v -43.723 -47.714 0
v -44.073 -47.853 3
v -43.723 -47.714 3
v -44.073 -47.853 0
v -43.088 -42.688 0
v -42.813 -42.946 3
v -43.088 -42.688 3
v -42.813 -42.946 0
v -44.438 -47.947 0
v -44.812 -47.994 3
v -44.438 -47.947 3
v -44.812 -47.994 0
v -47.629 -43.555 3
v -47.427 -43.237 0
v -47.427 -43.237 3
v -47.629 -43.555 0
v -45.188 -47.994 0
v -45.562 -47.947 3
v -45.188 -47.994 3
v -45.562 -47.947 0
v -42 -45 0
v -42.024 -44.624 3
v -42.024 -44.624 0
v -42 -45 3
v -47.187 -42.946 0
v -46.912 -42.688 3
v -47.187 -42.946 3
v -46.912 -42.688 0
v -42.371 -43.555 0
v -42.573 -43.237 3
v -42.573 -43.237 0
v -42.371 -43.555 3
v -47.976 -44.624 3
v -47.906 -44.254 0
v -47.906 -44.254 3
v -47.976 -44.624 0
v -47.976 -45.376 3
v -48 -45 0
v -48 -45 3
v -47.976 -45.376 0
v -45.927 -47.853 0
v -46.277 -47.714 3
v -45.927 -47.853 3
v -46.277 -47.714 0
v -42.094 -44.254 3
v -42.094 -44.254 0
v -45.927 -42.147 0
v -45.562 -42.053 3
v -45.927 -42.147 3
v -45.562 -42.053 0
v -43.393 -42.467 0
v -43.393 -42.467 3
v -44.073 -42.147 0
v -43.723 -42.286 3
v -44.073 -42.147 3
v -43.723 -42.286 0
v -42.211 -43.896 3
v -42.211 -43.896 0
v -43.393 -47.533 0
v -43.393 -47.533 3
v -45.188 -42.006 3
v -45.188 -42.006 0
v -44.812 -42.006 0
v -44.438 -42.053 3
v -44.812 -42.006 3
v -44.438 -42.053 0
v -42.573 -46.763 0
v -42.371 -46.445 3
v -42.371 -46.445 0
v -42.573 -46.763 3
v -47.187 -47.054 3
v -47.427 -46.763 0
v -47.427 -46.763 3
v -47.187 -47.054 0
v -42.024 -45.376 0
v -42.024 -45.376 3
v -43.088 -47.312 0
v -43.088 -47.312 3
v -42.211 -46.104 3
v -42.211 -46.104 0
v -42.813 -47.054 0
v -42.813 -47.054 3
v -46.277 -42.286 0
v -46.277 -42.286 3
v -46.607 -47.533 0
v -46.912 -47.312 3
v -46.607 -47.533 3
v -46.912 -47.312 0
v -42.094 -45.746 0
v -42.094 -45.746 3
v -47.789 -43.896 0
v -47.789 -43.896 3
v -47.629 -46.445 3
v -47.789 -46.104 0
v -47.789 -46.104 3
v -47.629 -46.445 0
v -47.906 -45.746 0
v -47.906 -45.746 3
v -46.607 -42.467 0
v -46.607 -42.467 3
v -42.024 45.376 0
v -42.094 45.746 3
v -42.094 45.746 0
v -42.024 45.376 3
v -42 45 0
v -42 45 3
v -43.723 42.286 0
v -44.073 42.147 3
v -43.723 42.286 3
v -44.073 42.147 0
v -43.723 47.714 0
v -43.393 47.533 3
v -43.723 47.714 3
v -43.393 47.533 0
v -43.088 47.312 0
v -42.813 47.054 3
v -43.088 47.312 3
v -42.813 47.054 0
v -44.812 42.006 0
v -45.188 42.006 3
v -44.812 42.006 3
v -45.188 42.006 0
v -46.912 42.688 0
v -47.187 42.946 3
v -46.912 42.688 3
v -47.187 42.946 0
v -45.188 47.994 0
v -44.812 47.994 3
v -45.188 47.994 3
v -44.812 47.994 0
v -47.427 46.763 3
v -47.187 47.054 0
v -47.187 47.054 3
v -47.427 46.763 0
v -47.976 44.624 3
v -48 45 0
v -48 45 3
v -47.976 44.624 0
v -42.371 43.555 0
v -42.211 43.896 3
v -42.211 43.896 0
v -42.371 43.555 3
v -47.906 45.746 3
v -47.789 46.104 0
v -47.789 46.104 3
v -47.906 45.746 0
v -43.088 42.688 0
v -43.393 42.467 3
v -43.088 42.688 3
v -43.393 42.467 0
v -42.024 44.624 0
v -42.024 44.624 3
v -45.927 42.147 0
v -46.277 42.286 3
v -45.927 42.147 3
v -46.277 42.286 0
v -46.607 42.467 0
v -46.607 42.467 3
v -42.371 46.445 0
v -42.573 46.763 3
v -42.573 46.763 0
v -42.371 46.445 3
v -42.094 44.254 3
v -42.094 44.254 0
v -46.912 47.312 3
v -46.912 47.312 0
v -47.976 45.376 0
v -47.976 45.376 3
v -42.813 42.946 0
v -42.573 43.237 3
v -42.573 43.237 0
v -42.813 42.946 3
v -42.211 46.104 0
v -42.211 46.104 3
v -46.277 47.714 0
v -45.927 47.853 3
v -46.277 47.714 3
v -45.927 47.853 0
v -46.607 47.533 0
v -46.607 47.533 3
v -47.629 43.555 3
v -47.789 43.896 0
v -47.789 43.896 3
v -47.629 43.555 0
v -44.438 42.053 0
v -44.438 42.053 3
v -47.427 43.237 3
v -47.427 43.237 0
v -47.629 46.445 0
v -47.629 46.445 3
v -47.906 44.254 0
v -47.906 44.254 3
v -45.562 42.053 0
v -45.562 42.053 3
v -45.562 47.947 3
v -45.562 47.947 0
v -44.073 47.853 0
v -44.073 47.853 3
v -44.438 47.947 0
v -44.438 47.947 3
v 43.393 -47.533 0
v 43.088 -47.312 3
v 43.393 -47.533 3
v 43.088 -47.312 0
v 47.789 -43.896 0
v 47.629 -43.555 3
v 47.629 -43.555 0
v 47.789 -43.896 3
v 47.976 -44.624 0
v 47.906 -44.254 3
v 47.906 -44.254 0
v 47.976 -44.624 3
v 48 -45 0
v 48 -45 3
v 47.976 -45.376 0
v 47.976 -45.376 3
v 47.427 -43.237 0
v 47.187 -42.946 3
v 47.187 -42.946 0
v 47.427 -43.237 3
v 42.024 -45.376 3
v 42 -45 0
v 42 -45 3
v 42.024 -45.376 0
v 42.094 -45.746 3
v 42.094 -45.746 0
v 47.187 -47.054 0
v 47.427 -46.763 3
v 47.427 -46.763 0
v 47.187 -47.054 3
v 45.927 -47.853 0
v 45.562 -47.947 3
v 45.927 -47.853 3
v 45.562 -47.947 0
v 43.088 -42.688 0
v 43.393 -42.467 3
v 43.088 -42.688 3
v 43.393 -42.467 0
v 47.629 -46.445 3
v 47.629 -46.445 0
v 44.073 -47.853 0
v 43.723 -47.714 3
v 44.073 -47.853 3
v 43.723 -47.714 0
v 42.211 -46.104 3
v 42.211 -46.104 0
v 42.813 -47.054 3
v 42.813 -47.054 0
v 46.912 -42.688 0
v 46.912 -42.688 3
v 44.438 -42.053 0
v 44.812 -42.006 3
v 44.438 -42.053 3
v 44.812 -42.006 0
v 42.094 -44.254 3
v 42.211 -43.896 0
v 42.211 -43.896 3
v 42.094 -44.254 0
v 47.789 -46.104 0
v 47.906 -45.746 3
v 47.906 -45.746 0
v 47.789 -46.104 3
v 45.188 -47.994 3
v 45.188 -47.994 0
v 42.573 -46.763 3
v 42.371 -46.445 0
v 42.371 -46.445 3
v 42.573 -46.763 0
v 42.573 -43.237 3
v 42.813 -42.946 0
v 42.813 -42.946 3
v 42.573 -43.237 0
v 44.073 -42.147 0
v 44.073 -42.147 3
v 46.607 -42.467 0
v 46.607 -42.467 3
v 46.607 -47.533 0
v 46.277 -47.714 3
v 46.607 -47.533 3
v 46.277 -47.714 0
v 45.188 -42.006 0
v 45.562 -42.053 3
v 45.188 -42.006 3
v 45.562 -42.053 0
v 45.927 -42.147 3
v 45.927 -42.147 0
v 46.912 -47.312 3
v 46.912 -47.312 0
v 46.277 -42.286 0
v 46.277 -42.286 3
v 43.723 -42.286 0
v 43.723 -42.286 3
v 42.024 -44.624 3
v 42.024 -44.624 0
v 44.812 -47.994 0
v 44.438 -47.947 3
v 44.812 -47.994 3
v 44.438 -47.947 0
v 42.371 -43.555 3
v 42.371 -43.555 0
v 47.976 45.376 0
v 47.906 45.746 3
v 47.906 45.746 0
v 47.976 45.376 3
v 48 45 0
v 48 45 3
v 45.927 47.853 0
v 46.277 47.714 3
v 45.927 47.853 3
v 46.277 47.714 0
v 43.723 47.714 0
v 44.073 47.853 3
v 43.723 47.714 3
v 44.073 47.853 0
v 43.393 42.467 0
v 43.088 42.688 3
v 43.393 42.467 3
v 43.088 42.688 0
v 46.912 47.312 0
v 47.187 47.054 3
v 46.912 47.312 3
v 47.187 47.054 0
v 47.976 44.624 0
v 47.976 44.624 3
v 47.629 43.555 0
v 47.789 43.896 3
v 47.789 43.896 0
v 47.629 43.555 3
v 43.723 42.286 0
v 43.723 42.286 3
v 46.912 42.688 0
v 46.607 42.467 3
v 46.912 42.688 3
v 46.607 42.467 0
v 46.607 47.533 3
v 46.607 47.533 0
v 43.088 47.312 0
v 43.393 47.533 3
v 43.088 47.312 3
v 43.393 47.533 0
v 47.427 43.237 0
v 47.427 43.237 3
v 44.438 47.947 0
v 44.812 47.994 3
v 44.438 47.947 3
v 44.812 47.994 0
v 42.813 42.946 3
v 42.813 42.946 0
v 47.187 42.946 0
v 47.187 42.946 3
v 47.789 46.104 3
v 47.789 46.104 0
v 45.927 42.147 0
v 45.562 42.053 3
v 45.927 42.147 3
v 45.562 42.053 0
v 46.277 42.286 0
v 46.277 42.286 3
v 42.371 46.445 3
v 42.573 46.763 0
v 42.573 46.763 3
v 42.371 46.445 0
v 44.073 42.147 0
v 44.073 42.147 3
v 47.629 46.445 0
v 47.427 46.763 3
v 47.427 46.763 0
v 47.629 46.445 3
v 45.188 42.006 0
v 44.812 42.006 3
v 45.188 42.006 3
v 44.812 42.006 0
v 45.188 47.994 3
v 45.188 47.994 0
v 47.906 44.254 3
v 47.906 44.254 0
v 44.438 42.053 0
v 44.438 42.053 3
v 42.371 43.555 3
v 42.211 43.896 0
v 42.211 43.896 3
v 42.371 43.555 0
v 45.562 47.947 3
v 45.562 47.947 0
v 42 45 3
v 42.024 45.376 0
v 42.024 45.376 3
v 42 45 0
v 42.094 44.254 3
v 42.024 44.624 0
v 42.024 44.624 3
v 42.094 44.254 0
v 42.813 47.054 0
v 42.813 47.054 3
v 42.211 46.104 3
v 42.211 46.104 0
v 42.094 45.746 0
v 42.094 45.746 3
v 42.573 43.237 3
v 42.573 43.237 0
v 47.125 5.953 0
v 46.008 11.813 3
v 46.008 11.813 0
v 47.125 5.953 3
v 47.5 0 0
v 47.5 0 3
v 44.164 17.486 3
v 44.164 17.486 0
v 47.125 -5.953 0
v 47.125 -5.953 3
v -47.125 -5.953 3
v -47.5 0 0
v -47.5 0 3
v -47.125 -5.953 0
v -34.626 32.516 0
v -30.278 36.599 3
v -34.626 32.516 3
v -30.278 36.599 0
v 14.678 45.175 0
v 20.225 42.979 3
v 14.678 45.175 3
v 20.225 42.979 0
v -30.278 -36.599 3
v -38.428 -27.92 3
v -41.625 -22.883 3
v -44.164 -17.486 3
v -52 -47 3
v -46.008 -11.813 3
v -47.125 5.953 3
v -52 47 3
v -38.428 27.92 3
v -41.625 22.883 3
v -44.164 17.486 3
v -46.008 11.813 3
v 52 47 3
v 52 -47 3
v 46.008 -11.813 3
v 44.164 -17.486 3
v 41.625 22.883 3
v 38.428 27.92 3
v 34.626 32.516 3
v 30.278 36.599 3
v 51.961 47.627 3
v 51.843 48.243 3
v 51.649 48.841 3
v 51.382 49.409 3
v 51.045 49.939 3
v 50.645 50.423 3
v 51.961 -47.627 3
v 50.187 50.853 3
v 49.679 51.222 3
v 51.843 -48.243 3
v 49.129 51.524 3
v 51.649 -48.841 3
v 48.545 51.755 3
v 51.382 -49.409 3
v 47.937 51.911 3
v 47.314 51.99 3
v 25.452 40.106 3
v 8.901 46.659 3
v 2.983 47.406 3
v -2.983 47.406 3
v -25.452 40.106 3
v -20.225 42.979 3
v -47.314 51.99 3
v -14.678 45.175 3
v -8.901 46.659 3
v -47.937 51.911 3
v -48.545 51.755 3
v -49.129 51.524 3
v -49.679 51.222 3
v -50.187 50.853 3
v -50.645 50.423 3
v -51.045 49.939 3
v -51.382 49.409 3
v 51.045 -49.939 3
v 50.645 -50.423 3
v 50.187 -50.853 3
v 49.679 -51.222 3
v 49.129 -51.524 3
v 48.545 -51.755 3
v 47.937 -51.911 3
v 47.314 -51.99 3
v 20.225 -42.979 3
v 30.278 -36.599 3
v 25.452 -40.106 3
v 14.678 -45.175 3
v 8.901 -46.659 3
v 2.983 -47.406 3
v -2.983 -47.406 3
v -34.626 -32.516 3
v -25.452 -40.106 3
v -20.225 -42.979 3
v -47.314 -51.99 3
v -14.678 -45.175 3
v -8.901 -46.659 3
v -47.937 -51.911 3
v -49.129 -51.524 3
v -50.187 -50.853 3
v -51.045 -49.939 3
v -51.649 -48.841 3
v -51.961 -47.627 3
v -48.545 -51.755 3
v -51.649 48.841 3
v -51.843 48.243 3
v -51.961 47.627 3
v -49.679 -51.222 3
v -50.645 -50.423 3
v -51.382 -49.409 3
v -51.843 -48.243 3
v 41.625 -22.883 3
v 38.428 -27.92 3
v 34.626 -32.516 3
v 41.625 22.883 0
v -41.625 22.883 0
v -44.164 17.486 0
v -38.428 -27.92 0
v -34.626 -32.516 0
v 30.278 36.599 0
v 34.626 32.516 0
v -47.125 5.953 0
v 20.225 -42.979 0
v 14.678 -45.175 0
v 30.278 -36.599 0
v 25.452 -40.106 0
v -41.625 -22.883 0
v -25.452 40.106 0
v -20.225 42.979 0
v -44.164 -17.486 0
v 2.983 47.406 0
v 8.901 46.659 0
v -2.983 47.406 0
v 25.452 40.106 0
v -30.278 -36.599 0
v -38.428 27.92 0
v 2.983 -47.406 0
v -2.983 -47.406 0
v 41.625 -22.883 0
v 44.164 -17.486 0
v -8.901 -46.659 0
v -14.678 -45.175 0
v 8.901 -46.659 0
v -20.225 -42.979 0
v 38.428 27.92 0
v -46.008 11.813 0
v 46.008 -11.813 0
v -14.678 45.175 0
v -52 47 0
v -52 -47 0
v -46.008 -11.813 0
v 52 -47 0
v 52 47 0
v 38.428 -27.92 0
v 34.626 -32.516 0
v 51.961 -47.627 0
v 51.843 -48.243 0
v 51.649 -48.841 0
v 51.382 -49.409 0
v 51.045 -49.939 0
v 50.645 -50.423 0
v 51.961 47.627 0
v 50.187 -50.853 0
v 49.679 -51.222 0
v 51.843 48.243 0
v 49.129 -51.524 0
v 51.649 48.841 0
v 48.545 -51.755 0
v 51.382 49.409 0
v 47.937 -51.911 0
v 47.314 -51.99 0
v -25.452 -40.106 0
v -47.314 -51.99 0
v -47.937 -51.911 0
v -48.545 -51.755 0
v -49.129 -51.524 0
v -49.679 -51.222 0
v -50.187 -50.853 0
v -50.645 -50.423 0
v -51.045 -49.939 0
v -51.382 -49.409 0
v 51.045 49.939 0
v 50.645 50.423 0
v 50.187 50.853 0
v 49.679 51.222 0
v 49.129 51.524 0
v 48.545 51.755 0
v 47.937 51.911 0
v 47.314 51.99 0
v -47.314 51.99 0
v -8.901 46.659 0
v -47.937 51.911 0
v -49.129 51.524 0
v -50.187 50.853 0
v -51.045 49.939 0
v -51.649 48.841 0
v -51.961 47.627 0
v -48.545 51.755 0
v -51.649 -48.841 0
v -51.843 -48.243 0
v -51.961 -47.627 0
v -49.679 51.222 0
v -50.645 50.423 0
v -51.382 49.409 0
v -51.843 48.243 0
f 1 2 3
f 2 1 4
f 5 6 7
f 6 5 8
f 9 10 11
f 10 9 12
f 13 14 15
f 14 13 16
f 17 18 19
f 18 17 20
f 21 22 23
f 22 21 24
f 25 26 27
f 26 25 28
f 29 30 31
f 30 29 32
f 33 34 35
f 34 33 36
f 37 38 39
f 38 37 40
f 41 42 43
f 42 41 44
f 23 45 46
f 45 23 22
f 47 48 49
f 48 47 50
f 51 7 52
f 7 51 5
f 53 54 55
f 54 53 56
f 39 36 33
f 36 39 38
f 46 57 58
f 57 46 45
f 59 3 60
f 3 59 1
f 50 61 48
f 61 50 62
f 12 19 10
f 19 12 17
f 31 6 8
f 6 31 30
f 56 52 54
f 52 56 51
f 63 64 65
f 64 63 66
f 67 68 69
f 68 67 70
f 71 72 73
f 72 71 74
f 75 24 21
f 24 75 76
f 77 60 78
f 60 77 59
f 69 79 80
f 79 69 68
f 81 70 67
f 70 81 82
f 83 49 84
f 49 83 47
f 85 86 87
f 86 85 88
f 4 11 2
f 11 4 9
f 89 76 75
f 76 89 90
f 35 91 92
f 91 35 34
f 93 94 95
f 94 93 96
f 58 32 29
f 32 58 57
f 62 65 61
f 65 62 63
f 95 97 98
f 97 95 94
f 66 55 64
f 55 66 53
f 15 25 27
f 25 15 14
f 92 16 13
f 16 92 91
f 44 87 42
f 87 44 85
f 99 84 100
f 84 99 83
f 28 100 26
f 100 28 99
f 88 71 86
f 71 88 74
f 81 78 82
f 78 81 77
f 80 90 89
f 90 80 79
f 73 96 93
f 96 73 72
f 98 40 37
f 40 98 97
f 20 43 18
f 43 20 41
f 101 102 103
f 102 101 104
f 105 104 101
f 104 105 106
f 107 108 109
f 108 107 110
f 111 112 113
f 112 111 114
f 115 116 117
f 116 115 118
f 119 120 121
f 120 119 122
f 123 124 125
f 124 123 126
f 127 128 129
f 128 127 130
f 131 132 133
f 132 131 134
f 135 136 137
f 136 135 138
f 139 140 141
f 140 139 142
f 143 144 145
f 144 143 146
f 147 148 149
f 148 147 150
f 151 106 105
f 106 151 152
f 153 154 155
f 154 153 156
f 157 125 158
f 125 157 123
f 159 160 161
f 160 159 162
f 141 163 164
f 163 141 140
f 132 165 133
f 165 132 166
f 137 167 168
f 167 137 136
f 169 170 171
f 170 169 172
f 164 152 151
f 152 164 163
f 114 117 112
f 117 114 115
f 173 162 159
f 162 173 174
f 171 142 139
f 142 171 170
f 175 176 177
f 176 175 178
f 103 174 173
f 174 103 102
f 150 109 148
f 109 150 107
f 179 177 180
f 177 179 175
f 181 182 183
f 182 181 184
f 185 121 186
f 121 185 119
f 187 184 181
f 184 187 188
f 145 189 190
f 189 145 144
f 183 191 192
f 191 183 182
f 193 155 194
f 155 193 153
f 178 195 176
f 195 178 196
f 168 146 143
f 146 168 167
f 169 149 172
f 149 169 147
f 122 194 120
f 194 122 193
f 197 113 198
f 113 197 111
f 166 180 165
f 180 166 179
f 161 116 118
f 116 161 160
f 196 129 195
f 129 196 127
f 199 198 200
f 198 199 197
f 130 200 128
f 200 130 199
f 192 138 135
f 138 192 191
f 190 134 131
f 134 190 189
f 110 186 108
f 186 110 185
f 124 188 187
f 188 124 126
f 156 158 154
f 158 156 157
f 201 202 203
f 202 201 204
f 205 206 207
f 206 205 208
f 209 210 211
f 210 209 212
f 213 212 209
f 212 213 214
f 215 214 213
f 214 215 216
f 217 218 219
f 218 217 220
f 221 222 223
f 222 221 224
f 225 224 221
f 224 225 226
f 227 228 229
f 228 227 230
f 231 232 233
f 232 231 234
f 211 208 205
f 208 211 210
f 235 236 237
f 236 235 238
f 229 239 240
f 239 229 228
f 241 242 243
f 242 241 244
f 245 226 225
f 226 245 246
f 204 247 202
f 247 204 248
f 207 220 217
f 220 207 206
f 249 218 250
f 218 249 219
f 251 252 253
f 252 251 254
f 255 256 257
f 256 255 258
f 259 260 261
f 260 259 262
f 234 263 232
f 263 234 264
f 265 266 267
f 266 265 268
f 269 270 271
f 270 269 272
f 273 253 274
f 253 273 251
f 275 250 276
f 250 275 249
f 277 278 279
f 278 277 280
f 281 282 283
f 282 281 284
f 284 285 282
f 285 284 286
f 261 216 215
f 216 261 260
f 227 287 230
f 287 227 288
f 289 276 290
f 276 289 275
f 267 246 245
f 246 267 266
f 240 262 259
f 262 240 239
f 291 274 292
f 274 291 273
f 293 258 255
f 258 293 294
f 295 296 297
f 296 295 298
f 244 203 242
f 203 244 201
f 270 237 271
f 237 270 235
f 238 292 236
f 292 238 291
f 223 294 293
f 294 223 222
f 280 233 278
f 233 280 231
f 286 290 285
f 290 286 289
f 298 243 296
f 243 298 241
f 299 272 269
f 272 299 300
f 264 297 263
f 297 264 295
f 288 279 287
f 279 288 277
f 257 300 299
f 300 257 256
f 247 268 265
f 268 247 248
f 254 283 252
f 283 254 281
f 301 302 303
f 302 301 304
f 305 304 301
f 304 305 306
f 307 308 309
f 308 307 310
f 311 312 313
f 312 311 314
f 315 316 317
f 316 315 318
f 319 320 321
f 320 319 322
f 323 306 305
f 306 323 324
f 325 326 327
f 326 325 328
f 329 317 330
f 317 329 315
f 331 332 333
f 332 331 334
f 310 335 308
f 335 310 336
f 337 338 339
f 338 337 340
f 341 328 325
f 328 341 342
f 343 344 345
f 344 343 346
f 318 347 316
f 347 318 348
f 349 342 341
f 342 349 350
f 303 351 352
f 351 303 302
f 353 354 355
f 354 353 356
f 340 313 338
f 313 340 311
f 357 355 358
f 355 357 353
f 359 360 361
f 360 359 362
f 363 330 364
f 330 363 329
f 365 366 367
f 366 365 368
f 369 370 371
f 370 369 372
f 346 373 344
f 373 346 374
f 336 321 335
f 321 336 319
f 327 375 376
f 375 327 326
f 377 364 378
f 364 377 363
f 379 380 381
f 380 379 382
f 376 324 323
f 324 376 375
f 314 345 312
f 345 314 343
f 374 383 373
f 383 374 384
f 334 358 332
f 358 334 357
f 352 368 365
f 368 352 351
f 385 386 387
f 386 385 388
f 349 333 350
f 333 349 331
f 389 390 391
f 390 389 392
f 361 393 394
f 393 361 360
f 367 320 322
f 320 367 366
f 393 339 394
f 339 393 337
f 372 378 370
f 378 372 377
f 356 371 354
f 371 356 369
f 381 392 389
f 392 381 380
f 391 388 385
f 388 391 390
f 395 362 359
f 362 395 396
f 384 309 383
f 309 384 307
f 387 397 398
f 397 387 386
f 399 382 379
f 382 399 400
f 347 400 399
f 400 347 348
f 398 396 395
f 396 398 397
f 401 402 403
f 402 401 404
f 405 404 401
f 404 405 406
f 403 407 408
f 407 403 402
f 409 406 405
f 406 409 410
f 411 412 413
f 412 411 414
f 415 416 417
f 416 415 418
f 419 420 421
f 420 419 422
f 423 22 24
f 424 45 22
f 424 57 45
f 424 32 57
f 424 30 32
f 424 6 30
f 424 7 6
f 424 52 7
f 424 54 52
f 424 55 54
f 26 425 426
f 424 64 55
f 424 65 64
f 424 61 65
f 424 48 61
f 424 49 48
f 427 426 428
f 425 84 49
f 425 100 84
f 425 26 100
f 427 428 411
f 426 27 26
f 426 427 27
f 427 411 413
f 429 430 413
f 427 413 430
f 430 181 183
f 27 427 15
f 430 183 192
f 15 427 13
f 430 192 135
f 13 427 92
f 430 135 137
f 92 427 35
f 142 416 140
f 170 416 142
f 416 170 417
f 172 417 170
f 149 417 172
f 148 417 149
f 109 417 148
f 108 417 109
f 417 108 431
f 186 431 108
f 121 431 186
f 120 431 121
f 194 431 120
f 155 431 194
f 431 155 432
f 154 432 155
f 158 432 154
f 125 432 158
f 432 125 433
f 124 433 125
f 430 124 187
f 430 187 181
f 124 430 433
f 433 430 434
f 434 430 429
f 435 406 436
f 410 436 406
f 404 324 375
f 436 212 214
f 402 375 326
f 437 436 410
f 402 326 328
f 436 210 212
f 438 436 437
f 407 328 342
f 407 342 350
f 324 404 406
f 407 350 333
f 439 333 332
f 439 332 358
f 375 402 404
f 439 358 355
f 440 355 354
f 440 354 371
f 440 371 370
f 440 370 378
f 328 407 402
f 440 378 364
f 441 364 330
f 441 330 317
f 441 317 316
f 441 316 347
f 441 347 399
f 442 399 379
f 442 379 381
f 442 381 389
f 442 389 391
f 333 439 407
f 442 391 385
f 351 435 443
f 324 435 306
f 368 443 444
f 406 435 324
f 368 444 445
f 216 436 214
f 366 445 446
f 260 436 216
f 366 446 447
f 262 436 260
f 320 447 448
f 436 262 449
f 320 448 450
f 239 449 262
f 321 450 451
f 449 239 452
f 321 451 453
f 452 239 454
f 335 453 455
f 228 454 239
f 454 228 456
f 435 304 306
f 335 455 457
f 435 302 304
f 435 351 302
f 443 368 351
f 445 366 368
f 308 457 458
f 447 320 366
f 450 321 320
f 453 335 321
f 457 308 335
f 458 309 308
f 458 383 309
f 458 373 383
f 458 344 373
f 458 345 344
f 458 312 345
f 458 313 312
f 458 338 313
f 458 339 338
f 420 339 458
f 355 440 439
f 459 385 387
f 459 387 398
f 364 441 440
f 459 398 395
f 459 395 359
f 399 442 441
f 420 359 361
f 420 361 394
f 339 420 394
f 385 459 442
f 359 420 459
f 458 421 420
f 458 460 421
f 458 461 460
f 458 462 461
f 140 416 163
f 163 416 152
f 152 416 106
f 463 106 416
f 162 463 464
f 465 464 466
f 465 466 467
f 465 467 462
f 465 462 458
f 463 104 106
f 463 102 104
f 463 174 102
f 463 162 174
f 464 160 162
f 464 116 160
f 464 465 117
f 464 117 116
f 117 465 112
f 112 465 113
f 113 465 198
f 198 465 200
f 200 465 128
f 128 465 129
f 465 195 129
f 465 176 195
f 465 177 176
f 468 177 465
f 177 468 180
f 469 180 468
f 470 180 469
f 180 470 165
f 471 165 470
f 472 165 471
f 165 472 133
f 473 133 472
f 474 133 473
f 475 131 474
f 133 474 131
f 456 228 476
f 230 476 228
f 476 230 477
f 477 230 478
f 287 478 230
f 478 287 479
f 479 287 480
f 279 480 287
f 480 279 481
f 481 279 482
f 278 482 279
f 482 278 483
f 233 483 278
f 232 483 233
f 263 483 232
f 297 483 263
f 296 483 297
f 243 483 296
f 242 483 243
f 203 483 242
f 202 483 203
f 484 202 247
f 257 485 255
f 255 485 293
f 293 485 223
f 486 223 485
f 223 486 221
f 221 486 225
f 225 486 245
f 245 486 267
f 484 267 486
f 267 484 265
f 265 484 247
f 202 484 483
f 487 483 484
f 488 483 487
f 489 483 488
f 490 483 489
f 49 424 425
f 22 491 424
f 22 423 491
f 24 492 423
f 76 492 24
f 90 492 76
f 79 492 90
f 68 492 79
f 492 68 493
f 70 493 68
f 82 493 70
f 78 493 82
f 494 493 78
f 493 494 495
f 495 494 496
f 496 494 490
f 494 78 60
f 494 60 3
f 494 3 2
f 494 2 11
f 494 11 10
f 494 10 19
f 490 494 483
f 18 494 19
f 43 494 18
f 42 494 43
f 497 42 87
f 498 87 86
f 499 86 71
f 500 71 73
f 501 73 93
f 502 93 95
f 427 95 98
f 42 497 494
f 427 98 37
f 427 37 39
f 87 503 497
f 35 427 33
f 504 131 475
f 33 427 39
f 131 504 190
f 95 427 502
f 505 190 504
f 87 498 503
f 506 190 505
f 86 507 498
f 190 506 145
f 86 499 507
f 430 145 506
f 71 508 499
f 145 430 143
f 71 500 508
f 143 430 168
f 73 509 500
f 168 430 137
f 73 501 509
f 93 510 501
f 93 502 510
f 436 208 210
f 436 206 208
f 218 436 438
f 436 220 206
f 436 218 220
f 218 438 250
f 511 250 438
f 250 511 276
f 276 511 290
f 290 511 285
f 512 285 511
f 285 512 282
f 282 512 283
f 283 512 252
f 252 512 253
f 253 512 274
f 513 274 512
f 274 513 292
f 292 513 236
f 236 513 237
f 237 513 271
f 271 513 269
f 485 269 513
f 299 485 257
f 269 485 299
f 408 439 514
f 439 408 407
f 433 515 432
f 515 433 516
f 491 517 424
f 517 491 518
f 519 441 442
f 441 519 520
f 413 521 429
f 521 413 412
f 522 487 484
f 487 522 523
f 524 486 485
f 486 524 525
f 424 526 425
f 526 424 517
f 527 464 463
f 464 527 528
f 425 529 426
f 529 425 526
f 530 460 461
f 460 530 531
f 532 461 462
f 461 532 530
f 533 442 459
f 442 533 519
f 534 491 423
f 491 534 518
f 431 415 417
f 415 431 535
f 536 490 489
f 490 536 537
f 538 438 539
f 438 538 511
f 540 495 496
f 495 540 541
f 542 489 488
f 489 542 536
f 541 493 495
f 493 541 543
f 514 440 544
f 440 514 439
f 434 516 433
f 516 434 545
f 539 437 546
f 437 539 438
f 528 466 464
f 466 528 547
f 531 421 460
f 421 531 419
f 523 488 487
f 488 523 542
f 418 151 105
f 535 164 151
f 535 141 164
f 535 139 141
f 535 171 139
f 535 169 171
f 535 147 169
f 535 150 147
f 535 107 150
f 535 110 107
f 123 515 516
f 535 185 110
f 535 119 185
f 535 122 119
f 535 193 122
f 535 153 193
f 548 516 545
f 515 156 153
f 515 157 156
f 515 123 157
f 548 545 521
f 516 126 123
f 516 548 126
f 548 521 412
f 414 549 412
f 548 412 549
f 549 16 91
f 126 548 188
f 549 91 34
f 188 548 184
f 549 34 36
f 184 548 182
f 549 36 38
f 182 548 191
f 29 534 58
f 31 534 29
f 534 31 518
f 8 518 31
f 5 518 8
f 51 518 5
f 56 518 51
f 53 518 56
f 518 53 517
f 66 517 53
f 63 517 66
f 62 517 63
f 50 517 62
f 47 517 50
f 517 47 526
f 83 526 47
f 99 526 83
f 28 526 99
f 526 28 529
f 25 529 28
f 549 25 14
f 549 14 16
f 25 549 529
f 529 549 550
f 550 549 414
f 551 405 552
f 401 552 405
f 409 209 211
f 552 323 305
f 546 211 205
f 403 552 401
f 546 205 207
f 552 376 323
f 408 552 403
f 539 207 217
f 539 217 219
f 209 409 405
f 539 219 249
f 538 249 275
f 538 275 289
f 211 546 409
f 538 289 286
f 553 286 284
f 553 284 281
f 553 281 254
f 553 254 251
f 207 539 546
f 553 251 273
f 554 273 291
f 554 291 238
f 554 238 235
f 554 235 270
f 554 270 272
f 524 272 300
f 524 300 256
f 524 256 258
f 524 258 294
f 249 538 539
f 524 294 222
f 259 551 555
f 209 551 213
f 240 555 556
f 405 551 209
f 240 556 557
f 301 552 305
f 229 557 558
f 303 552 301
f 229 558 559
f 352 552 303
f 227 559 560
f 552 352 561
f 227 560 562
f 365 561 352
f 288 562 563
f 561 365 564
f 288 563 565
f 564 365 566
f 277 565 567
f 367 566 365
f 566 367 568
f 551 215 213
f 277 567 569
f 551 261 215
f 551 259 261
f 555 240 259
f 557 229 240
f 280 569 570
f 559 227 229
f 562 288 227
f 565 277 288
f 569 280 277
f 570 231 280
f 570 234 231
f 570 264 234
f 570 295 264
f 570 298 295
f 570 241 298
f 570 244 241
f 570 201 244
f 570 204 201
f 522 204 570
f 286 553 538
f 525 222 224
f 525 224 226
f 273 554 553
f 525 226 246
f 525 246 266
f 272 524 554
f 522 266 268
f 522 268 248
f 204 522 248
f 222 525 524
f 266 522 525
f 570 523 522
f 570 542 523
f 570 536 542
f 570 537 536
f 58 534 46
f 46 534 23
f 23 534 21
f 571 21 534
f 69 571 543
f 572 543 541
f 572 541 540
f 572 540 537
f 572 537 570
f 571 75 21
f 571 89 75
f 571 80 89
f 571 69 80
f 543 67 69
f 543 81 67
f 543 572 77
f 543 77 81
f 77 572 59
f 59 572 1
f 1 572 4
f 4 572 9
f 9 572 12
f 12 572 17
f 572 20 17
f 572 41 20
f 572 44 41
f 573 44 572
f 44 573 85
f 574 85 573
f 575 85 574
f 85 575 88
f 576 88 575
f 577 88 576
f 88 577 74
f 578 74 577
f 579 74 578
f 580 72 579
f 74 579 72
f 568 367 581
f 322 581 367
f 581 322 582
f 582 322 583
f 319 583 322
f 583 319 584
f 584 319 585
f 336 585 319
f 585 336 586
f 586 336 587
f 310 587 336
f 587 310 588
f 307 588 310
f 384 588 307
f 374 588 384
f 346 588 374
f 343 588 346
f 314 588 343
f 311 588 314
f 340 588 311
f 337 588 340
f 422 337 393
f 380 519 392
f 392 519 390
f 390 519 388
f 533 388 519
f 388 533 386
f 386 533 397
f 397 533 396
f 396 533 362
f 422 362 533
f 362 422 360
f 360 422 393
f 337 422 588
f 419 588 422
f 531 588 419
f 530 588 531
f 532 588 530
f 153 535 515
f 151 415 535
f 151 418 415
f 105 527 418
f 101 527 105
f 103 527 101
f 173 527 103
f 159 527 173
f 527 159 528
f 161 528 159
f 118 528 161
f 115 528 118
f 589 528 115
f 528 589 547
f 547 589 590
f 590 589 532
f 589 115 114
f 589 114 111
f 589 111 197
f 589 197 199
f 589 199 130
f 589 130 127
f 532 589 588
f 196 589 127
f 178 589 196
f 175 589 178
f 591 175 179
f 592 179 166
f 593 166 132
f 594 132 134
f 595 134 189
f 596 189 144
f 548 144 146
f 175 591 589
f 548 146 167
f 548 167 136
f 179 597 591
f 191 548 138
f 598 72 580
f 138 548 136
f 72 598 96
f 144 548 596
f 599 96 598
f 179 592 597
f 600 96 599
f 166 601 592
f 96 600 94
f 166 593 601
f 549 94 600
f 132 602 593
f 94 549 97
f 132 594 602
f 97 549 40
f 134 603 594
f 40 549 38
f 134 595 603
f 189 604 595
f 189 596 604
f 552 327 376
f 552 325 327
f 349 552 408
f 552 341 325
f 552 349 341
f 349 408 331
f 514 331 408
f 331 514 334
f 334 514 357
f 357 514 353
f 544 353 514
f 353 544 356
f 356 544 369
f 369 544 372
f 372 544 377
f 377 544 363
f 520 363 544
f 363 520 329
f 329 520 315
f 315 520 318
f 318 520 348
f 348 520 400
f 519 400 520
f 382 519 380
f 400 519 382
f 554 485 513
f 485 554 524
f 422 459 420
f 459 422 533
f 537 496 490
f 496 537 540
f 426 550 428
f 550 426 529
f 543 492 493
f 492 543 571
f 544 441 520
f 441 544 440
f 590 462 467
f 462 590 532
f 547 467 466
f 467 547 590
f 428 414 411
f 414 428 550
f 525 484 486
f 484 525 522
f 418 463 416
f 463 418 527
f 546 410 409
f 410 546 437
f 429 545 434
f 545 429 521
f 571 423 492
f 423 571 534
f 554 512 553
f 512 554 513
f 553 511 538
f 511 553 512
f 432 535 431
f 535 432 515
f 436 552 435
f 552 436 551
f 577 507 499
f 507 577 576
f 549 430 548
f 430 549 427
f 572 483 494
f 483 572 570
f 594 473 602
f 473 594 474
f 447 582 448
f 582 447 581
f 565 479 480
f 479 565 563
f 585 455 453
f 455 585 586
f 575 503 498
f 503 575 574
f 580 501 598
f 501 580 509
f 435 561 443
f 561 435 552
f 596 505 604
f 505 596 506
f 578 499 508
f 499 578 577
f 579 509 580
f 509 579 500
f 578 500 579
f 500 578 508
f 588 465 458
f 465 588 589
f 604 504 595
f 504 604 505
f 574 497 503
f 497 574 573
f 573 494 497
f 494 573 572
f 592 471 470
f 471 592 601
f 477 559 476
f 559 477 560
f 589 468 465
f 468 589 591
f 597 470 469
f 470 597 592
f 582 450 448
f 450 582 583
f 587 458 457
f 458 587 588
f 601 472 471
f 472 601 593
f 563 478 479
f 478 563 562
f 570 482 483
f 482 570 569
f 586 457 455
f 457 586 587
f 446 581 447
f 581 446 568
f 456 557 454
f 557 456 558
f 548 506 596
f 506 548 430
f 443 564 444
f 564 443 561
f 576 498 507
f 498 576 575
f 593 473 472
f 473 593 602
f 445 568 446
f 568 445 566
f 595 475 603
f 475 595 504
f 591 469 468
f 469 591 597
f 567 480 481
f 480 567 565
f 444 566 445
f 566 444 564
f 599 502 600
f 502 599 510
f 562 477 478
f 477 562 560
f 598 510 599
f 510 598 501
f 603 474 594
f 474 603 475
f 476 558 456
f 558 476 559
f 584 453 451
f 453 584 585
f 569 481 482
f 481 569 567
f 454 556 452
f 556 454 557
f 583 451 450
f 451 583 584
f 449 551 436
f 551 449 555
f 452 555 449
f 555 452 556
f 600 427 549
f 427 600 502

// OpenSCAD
$fn = 50;


difference() {
	union() {
		hull() {
			translate(v = [-47.0000000000, 47.0000000000, 0]) {
				cylinder(h = 3, r = 5);
			}
			translate(v = [47.0000000000, 47.0000000000, 0]) {
				cylinder(h = 3, r = 5);
			}
			translate(v = [-47.0000000000, -47.0000000000, 0]) {
				cylinder(h = 3, r = 5);
			}
			translate(v = [47.0000000000, -47.0000000000, 0]) {
				cylinder(h = 3, r = 5);
			}
		}
	}
	union() {
		#translate(v = [-45.0000000000, -45.0000000000, -100.0000000000]) {
			cylinder(h = 200, r = 3.0000000000);
		}
		#translate(v = [-45.0000000000, 45.0000000000, -100.0000000000]) {
			cylinder(h = 200, r = 3.0000000000);
		}
		#translate(v = [45.0000000000, -45.0000000000, -100.0000000000]) {
			cylinder(h = 200, r = 3.0000000000);
		}
		#translate(v = [45.0000000000, 45.0000000000, -100.0000000000]) {
			cylinder(h = 200, r = 3.0000000000);
		}
		#cylinder(h = 3, r = 47.5000000000);
	}
}
